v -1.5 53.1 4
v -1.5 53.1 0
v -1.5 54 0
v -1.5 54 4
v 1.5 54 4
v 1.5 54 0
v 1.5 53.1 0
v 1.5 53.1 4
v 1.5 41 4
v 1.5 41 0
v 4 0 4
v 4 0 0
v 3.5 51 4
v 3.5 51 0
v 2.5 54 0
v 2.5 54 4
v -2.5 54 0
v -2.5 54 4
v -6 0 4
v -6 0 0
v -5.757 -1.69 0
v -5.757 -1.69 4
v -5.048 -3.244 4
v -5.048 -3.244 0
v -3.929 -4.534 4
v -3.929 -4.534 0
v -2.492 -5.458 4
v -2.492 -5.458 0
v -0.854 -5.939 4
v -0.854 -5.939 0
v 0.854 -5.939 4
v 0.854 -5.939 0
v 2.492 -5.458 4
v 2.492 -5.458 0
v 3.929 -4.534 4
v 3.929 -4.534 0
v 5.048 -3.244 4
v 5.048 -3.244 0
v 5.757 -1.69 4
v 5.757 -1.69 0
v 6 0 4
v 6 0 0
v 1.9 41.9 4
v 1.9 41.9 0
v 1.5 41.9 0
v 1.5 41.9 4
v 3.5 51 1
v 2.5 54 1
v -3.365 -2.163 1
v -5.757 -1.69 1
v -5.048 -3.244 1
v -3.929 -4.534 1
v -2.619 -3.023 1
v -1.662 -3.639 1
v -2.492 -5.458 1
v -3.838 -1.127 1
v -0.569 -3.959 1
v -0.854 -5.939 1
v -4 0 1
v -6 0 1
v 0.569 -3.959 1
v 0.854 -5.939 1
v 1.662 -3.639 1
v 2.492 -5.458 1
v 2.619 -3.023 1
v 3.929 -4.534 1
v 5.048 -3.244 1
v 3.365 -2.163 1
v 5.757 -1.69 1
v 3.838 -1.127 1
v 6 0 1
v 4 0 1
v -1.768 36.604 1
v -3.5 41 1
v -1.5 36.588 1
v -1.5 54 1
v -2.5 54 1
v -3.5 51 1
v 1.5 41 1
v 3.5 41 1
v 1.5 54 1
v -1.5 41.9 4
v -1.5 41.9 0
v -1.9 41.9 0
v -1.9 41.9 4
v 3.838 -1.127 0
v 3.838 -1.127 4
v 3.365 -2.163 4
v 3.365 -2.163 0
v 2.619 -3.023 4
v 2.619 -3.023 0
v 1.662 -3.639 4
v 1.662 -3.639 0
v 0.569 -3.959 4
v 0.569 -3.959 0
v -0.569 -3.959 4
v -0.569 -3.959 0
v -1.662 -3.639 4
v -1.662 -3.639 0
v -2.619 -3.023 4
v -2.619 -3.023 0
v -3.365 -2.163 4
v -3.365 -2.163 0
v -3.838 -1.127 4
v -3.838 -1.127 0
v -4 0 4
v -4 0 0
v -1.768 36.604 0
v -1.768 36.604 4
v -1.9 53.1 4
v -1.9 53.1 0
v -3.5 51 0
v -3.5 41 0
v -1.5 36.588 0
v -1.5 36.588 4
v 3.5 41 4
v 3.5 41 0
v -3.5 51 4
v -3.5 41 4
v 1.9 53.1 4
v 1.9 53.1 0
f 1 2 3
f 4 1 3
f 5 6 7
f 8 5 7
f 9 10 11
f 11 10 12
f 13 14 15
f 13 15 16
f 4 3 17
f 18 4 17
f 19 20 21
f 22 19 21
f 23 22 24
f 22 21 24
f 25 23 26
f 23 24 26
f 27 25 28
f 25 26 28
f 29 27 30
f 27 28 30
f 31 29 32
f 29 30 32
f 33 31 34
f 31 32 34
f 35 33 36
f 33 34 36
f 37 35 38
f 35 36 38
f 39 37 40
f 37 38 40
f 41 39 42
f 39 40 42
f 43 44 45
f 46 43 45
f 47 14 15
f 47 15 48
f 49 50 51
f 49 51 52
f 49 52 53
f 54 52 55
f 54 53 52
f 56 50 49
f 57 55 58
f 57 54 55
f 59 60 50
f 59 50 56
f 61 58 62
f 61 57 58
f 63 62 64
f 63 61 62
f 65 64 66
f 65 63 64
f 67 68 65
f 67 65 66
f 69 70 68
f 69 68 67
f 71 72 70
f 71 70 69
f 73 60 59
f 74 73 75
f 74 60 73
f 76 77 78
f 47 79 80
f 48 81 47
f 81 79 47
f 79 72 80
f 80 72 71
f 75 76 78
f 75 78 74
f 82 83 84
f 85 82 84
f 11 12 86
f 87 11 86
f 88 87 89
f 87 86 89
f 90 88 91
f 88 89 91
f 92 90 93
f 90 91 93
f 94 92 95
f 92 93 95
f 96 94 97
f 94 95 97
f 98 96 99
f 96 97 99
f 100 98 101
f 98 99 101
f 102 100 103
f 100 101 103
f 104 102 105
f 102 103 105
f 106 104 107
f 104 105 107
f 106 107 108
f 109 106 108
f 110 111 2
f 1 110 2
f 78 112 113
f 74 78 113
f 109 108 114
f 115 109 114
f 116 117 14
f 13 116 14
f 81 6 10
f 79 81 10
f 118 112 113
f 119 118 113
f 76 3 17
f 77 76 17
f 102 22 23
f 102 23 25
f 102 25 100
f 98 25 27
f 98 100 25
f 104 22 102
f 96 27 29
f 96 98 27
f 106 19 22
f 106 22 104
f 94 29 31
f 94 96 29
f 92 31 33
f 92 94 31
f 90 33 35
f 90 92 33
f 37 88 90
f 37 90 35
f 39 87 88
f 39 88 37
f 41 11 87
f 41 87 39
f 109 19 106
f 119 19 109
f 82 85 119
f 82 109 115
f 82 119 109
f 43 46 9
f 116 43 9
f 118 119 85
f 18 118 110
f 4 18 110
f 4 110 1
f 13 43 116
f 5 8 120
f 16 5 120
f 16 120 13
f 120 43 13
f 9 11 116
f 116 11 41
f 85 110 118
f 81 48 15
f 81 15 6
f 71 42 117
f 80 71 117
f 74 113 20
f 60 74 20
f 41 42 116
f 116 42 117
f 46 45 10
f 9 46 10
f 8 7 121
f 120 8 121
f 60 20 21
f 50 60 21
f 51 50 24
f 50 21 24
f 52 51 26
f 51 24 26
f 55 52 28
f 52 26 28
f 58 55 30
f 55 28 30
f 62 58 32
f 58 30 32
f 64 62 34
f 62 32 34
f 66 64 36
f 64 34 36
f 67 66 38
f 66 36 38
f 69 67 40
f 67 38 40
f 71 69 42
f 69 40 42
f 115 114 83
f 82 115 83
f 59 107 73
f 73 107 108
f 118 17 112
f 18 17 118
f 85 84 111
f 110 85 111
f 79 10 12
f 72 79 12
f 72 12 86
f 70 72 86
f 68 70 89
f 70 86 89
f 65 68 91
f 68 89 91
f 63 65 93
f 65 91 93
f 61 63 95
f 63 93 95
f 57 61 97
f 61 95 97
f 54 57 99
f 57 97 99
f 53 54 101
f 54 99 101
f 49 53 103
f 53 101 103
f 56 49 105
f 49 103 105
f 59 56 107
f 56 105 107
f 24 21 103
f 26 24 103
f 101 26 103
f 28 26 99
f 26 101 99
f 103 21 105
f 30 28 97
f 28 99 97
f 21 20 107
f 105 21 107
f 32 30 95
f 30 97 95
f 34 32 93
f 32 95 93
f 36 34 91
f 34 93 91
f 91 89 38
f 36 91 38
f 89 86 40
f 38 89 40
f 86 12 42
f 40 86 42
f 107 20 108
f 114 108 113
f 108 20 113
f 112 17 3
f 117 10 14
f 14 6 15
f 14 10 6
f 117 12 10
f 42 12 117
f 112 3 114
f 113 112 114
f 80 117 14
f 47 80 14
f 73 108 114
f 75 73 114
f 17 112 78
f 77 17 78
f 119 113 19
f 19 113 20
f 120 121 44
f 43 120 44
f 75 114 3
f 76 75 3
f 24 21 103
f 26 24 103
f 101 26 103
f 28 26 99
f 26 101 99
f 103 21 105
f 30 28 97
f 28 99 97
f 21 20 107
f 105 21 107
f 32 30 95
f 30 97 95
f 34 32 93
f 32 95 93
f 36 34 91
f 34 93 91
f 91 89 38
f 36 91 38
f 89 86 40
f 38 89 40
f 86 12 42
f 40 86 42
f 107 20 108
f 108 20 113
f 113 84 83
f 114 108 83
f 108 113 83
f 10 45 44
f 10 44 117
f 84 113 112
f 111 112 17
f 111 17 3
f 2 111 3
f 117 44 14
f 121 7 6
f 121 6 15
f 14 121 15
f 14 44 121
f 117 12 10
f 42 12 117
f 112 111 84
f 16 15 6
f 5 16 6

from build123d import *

# Parameters (mm, degrees)
F0_W       = 0.4
F0_H       = 11.2
F1_DEPTH   = 1
F2_DEPTH   = 4
F3_SIZE2   = 1
F3_SIZE    = 3
F3_2_SIZE2 = 1
F3_2_SIZE  = 3
F4_SIZE2   = 3
F4_SIZE    = 1
F4_2_SIZE2 = 3
F4_2_SIZE  = 1


with BuildPart() as f1:
    # F0 (on Top) → F1 (new body)
    with BuildSketch(Plane.XY):
        with BuildLine():
            ThreePointArc((4, 0), (0, -4), (-4, 0))
            Line((-4, 0), (-1.7680275698, 36.6043488656))
            Line((-1.7680275698, 36.6043488656), (-1.5, 36.5880057216))
            Line((-1.5, 36.5880057216), (-1.5, 41.9000011325))
            Line((-1.5, 41.9000011325), (-1.9, 41.9000011325))
            Line((-1.9, 41.9000011325), (-1.9, 53.1000011325))
            Line((-1.9, 53.1000011325), (-1.5, 53.1000011325))
            Line((-1.5, 53.1000011325), (-1.5, 54.0000011325))
            Line((-1.5, 54.0000011325), (-3.5, 54.0000011325))
            Line((-3.5, 54.0000011325), (-3.5, 41.0000011325))
            Line((-3.5, 41.0000011325), (-6, 0))
            ThreePointArc((-6, 0), (0, -6), (6, 0))
            Line((6, 0), (3.5, 41.0000011325))
            Line((3.5, 41.0000011325), (3.5, 54.0000011325))
            Line((3.5, 54.0000011325), (1.5, 54.0000011325))
            Line((1.5, 54.0000011325), (1.5, 53.1000011325))
            Line((1.5, 53.1000011325), (1.9, 53.1000011325))
            Line((1.9, 53.1000011325), (1.9, 41.9000011325))
            Line((1.9, 41.9000011325), (1.5, 41.9000011325))
            Line((1.5, 41.9000011325), (1.5, 41.0000011325))
            Line((1.5, 41.0000011325), (4, 0))
        make_face()
        with Locations((1.7, 47.5000011325)):
            Rectangle(F0_W, F0_H)
        with Locations((-1.7, 47.5000011325)):
            Rectangle(F0_W, F0_H)
    extrude(amount=F1_DEPTH)

    # F3#2
    f3_2_edges = [f1.edges().sort_by_distance(p)[0] for p in [
        (-3.5, 54.000001, 0.5),
    ]]
    f3_2_side = f1.faces().sort_by_distance((-3.5, 47.500001, 0.5))[0]
    chamfer(f3_2_edges, length=F3_2_SIZE, length2=F3_2_SIZE2, reference=f3_2_side)

    # F4
    f4_edges = [f1.edges().sort_by_distance(p)[0] for p in [
        (3.5, 54.000001, 0.5),
    ]]
    f4_side = f1.faces().sort_by_distance((2.5, 54.000001, 0.5))[0]
    chamfer(f4_edges, length=F4_SIZE, length2=F4_SIZE2, reference=f4_side)


with BuildPart() as f2:
    # F0 (on Top) → F2 (new body)
    with BuildSketch(Plane.XY):
        with BuildLine():
            ThreePointArc((4, 0), (0, -4), (-4, 0))
            Line((-4, 0), (-1.7680275698, 36.6043488656))
            Line((-1.7680275698, 36.6043488656), (-1.5, 36.5880057216))
            Line((-1.5, 36.5880057216), (-1.5, 41.9000011325))
            Line((-1.5, 41.9000011325), (-1.9, 41.9000011325))
            Line((-1.9, 41.9000011325), (-1.9, 53.1000011325))
            Line((-1.9, 53.1000011325), (-1.5, 53.1000011325))
            Line((-1.5, 53.1000011325), (-1.5, 54.0000011325))
            Line((-1.5, 54.0000011325), (-3.5, 54.0000011325))
            Line((-3.5, 54.0000011325), (-3.5, 41.0000011325))
            Line((-3.5, 41.0000011325), (-6, 0))
            ThreePointArc((-6, 0), (0, -6), (6, 0))
            Line((6, 0), (3.5, 41.0000011325))
            Line((3.5, 41.0000011325), (3.5, 54.0000011325))
            Line((3.5, 54.0000011325), (1.5, 54.0000011325))
            Line((1.5, 54.0000011325), (1.5, 53.1000011325))
            Line((1.5, 53.1000011325), (1.9, 53.1000011325))
            Line((1.9, 53.1000011325), (1.9, 41.9000011325))
            Line((1.9, 41.9000011325), (1.5, 41.9000011325))
            Line((1.5, 41.9000011325), (1.5, 41.0000011325))
            Line((1.5, 41.0000011325), (4, 0))
        make_face()
    extrude(amount=F2_DEPTH)

    # F3
    f3_edges = [f2.edges().sort_by_distance(p)[0] for p in [
        (-3.5, 54.000001, 2),
    ]]
    f3_side = f2.faces().sort_by_distance((-3.5, 47.500001, 2))[0]
    chamfer(f3_edges, length=F3_SIZE, length2=F3_SIZE2, reference=f3_side)

    # F4#2
    f4_2_edges = [f2.edges().sort_by_distance(p)[0] for p in [
        (3.5, 54.000001, 2),
    ]]
    f4_2_side = f2.faces().sort_by_distance((2.5, 54.000001, 2))[0]
    chamfer(f4_2_edges, length=F4_2_SIZE, length2=F4_2_SIZE2, reference=f4_2_side)


solid = Compound([f1.part, f2.part])
